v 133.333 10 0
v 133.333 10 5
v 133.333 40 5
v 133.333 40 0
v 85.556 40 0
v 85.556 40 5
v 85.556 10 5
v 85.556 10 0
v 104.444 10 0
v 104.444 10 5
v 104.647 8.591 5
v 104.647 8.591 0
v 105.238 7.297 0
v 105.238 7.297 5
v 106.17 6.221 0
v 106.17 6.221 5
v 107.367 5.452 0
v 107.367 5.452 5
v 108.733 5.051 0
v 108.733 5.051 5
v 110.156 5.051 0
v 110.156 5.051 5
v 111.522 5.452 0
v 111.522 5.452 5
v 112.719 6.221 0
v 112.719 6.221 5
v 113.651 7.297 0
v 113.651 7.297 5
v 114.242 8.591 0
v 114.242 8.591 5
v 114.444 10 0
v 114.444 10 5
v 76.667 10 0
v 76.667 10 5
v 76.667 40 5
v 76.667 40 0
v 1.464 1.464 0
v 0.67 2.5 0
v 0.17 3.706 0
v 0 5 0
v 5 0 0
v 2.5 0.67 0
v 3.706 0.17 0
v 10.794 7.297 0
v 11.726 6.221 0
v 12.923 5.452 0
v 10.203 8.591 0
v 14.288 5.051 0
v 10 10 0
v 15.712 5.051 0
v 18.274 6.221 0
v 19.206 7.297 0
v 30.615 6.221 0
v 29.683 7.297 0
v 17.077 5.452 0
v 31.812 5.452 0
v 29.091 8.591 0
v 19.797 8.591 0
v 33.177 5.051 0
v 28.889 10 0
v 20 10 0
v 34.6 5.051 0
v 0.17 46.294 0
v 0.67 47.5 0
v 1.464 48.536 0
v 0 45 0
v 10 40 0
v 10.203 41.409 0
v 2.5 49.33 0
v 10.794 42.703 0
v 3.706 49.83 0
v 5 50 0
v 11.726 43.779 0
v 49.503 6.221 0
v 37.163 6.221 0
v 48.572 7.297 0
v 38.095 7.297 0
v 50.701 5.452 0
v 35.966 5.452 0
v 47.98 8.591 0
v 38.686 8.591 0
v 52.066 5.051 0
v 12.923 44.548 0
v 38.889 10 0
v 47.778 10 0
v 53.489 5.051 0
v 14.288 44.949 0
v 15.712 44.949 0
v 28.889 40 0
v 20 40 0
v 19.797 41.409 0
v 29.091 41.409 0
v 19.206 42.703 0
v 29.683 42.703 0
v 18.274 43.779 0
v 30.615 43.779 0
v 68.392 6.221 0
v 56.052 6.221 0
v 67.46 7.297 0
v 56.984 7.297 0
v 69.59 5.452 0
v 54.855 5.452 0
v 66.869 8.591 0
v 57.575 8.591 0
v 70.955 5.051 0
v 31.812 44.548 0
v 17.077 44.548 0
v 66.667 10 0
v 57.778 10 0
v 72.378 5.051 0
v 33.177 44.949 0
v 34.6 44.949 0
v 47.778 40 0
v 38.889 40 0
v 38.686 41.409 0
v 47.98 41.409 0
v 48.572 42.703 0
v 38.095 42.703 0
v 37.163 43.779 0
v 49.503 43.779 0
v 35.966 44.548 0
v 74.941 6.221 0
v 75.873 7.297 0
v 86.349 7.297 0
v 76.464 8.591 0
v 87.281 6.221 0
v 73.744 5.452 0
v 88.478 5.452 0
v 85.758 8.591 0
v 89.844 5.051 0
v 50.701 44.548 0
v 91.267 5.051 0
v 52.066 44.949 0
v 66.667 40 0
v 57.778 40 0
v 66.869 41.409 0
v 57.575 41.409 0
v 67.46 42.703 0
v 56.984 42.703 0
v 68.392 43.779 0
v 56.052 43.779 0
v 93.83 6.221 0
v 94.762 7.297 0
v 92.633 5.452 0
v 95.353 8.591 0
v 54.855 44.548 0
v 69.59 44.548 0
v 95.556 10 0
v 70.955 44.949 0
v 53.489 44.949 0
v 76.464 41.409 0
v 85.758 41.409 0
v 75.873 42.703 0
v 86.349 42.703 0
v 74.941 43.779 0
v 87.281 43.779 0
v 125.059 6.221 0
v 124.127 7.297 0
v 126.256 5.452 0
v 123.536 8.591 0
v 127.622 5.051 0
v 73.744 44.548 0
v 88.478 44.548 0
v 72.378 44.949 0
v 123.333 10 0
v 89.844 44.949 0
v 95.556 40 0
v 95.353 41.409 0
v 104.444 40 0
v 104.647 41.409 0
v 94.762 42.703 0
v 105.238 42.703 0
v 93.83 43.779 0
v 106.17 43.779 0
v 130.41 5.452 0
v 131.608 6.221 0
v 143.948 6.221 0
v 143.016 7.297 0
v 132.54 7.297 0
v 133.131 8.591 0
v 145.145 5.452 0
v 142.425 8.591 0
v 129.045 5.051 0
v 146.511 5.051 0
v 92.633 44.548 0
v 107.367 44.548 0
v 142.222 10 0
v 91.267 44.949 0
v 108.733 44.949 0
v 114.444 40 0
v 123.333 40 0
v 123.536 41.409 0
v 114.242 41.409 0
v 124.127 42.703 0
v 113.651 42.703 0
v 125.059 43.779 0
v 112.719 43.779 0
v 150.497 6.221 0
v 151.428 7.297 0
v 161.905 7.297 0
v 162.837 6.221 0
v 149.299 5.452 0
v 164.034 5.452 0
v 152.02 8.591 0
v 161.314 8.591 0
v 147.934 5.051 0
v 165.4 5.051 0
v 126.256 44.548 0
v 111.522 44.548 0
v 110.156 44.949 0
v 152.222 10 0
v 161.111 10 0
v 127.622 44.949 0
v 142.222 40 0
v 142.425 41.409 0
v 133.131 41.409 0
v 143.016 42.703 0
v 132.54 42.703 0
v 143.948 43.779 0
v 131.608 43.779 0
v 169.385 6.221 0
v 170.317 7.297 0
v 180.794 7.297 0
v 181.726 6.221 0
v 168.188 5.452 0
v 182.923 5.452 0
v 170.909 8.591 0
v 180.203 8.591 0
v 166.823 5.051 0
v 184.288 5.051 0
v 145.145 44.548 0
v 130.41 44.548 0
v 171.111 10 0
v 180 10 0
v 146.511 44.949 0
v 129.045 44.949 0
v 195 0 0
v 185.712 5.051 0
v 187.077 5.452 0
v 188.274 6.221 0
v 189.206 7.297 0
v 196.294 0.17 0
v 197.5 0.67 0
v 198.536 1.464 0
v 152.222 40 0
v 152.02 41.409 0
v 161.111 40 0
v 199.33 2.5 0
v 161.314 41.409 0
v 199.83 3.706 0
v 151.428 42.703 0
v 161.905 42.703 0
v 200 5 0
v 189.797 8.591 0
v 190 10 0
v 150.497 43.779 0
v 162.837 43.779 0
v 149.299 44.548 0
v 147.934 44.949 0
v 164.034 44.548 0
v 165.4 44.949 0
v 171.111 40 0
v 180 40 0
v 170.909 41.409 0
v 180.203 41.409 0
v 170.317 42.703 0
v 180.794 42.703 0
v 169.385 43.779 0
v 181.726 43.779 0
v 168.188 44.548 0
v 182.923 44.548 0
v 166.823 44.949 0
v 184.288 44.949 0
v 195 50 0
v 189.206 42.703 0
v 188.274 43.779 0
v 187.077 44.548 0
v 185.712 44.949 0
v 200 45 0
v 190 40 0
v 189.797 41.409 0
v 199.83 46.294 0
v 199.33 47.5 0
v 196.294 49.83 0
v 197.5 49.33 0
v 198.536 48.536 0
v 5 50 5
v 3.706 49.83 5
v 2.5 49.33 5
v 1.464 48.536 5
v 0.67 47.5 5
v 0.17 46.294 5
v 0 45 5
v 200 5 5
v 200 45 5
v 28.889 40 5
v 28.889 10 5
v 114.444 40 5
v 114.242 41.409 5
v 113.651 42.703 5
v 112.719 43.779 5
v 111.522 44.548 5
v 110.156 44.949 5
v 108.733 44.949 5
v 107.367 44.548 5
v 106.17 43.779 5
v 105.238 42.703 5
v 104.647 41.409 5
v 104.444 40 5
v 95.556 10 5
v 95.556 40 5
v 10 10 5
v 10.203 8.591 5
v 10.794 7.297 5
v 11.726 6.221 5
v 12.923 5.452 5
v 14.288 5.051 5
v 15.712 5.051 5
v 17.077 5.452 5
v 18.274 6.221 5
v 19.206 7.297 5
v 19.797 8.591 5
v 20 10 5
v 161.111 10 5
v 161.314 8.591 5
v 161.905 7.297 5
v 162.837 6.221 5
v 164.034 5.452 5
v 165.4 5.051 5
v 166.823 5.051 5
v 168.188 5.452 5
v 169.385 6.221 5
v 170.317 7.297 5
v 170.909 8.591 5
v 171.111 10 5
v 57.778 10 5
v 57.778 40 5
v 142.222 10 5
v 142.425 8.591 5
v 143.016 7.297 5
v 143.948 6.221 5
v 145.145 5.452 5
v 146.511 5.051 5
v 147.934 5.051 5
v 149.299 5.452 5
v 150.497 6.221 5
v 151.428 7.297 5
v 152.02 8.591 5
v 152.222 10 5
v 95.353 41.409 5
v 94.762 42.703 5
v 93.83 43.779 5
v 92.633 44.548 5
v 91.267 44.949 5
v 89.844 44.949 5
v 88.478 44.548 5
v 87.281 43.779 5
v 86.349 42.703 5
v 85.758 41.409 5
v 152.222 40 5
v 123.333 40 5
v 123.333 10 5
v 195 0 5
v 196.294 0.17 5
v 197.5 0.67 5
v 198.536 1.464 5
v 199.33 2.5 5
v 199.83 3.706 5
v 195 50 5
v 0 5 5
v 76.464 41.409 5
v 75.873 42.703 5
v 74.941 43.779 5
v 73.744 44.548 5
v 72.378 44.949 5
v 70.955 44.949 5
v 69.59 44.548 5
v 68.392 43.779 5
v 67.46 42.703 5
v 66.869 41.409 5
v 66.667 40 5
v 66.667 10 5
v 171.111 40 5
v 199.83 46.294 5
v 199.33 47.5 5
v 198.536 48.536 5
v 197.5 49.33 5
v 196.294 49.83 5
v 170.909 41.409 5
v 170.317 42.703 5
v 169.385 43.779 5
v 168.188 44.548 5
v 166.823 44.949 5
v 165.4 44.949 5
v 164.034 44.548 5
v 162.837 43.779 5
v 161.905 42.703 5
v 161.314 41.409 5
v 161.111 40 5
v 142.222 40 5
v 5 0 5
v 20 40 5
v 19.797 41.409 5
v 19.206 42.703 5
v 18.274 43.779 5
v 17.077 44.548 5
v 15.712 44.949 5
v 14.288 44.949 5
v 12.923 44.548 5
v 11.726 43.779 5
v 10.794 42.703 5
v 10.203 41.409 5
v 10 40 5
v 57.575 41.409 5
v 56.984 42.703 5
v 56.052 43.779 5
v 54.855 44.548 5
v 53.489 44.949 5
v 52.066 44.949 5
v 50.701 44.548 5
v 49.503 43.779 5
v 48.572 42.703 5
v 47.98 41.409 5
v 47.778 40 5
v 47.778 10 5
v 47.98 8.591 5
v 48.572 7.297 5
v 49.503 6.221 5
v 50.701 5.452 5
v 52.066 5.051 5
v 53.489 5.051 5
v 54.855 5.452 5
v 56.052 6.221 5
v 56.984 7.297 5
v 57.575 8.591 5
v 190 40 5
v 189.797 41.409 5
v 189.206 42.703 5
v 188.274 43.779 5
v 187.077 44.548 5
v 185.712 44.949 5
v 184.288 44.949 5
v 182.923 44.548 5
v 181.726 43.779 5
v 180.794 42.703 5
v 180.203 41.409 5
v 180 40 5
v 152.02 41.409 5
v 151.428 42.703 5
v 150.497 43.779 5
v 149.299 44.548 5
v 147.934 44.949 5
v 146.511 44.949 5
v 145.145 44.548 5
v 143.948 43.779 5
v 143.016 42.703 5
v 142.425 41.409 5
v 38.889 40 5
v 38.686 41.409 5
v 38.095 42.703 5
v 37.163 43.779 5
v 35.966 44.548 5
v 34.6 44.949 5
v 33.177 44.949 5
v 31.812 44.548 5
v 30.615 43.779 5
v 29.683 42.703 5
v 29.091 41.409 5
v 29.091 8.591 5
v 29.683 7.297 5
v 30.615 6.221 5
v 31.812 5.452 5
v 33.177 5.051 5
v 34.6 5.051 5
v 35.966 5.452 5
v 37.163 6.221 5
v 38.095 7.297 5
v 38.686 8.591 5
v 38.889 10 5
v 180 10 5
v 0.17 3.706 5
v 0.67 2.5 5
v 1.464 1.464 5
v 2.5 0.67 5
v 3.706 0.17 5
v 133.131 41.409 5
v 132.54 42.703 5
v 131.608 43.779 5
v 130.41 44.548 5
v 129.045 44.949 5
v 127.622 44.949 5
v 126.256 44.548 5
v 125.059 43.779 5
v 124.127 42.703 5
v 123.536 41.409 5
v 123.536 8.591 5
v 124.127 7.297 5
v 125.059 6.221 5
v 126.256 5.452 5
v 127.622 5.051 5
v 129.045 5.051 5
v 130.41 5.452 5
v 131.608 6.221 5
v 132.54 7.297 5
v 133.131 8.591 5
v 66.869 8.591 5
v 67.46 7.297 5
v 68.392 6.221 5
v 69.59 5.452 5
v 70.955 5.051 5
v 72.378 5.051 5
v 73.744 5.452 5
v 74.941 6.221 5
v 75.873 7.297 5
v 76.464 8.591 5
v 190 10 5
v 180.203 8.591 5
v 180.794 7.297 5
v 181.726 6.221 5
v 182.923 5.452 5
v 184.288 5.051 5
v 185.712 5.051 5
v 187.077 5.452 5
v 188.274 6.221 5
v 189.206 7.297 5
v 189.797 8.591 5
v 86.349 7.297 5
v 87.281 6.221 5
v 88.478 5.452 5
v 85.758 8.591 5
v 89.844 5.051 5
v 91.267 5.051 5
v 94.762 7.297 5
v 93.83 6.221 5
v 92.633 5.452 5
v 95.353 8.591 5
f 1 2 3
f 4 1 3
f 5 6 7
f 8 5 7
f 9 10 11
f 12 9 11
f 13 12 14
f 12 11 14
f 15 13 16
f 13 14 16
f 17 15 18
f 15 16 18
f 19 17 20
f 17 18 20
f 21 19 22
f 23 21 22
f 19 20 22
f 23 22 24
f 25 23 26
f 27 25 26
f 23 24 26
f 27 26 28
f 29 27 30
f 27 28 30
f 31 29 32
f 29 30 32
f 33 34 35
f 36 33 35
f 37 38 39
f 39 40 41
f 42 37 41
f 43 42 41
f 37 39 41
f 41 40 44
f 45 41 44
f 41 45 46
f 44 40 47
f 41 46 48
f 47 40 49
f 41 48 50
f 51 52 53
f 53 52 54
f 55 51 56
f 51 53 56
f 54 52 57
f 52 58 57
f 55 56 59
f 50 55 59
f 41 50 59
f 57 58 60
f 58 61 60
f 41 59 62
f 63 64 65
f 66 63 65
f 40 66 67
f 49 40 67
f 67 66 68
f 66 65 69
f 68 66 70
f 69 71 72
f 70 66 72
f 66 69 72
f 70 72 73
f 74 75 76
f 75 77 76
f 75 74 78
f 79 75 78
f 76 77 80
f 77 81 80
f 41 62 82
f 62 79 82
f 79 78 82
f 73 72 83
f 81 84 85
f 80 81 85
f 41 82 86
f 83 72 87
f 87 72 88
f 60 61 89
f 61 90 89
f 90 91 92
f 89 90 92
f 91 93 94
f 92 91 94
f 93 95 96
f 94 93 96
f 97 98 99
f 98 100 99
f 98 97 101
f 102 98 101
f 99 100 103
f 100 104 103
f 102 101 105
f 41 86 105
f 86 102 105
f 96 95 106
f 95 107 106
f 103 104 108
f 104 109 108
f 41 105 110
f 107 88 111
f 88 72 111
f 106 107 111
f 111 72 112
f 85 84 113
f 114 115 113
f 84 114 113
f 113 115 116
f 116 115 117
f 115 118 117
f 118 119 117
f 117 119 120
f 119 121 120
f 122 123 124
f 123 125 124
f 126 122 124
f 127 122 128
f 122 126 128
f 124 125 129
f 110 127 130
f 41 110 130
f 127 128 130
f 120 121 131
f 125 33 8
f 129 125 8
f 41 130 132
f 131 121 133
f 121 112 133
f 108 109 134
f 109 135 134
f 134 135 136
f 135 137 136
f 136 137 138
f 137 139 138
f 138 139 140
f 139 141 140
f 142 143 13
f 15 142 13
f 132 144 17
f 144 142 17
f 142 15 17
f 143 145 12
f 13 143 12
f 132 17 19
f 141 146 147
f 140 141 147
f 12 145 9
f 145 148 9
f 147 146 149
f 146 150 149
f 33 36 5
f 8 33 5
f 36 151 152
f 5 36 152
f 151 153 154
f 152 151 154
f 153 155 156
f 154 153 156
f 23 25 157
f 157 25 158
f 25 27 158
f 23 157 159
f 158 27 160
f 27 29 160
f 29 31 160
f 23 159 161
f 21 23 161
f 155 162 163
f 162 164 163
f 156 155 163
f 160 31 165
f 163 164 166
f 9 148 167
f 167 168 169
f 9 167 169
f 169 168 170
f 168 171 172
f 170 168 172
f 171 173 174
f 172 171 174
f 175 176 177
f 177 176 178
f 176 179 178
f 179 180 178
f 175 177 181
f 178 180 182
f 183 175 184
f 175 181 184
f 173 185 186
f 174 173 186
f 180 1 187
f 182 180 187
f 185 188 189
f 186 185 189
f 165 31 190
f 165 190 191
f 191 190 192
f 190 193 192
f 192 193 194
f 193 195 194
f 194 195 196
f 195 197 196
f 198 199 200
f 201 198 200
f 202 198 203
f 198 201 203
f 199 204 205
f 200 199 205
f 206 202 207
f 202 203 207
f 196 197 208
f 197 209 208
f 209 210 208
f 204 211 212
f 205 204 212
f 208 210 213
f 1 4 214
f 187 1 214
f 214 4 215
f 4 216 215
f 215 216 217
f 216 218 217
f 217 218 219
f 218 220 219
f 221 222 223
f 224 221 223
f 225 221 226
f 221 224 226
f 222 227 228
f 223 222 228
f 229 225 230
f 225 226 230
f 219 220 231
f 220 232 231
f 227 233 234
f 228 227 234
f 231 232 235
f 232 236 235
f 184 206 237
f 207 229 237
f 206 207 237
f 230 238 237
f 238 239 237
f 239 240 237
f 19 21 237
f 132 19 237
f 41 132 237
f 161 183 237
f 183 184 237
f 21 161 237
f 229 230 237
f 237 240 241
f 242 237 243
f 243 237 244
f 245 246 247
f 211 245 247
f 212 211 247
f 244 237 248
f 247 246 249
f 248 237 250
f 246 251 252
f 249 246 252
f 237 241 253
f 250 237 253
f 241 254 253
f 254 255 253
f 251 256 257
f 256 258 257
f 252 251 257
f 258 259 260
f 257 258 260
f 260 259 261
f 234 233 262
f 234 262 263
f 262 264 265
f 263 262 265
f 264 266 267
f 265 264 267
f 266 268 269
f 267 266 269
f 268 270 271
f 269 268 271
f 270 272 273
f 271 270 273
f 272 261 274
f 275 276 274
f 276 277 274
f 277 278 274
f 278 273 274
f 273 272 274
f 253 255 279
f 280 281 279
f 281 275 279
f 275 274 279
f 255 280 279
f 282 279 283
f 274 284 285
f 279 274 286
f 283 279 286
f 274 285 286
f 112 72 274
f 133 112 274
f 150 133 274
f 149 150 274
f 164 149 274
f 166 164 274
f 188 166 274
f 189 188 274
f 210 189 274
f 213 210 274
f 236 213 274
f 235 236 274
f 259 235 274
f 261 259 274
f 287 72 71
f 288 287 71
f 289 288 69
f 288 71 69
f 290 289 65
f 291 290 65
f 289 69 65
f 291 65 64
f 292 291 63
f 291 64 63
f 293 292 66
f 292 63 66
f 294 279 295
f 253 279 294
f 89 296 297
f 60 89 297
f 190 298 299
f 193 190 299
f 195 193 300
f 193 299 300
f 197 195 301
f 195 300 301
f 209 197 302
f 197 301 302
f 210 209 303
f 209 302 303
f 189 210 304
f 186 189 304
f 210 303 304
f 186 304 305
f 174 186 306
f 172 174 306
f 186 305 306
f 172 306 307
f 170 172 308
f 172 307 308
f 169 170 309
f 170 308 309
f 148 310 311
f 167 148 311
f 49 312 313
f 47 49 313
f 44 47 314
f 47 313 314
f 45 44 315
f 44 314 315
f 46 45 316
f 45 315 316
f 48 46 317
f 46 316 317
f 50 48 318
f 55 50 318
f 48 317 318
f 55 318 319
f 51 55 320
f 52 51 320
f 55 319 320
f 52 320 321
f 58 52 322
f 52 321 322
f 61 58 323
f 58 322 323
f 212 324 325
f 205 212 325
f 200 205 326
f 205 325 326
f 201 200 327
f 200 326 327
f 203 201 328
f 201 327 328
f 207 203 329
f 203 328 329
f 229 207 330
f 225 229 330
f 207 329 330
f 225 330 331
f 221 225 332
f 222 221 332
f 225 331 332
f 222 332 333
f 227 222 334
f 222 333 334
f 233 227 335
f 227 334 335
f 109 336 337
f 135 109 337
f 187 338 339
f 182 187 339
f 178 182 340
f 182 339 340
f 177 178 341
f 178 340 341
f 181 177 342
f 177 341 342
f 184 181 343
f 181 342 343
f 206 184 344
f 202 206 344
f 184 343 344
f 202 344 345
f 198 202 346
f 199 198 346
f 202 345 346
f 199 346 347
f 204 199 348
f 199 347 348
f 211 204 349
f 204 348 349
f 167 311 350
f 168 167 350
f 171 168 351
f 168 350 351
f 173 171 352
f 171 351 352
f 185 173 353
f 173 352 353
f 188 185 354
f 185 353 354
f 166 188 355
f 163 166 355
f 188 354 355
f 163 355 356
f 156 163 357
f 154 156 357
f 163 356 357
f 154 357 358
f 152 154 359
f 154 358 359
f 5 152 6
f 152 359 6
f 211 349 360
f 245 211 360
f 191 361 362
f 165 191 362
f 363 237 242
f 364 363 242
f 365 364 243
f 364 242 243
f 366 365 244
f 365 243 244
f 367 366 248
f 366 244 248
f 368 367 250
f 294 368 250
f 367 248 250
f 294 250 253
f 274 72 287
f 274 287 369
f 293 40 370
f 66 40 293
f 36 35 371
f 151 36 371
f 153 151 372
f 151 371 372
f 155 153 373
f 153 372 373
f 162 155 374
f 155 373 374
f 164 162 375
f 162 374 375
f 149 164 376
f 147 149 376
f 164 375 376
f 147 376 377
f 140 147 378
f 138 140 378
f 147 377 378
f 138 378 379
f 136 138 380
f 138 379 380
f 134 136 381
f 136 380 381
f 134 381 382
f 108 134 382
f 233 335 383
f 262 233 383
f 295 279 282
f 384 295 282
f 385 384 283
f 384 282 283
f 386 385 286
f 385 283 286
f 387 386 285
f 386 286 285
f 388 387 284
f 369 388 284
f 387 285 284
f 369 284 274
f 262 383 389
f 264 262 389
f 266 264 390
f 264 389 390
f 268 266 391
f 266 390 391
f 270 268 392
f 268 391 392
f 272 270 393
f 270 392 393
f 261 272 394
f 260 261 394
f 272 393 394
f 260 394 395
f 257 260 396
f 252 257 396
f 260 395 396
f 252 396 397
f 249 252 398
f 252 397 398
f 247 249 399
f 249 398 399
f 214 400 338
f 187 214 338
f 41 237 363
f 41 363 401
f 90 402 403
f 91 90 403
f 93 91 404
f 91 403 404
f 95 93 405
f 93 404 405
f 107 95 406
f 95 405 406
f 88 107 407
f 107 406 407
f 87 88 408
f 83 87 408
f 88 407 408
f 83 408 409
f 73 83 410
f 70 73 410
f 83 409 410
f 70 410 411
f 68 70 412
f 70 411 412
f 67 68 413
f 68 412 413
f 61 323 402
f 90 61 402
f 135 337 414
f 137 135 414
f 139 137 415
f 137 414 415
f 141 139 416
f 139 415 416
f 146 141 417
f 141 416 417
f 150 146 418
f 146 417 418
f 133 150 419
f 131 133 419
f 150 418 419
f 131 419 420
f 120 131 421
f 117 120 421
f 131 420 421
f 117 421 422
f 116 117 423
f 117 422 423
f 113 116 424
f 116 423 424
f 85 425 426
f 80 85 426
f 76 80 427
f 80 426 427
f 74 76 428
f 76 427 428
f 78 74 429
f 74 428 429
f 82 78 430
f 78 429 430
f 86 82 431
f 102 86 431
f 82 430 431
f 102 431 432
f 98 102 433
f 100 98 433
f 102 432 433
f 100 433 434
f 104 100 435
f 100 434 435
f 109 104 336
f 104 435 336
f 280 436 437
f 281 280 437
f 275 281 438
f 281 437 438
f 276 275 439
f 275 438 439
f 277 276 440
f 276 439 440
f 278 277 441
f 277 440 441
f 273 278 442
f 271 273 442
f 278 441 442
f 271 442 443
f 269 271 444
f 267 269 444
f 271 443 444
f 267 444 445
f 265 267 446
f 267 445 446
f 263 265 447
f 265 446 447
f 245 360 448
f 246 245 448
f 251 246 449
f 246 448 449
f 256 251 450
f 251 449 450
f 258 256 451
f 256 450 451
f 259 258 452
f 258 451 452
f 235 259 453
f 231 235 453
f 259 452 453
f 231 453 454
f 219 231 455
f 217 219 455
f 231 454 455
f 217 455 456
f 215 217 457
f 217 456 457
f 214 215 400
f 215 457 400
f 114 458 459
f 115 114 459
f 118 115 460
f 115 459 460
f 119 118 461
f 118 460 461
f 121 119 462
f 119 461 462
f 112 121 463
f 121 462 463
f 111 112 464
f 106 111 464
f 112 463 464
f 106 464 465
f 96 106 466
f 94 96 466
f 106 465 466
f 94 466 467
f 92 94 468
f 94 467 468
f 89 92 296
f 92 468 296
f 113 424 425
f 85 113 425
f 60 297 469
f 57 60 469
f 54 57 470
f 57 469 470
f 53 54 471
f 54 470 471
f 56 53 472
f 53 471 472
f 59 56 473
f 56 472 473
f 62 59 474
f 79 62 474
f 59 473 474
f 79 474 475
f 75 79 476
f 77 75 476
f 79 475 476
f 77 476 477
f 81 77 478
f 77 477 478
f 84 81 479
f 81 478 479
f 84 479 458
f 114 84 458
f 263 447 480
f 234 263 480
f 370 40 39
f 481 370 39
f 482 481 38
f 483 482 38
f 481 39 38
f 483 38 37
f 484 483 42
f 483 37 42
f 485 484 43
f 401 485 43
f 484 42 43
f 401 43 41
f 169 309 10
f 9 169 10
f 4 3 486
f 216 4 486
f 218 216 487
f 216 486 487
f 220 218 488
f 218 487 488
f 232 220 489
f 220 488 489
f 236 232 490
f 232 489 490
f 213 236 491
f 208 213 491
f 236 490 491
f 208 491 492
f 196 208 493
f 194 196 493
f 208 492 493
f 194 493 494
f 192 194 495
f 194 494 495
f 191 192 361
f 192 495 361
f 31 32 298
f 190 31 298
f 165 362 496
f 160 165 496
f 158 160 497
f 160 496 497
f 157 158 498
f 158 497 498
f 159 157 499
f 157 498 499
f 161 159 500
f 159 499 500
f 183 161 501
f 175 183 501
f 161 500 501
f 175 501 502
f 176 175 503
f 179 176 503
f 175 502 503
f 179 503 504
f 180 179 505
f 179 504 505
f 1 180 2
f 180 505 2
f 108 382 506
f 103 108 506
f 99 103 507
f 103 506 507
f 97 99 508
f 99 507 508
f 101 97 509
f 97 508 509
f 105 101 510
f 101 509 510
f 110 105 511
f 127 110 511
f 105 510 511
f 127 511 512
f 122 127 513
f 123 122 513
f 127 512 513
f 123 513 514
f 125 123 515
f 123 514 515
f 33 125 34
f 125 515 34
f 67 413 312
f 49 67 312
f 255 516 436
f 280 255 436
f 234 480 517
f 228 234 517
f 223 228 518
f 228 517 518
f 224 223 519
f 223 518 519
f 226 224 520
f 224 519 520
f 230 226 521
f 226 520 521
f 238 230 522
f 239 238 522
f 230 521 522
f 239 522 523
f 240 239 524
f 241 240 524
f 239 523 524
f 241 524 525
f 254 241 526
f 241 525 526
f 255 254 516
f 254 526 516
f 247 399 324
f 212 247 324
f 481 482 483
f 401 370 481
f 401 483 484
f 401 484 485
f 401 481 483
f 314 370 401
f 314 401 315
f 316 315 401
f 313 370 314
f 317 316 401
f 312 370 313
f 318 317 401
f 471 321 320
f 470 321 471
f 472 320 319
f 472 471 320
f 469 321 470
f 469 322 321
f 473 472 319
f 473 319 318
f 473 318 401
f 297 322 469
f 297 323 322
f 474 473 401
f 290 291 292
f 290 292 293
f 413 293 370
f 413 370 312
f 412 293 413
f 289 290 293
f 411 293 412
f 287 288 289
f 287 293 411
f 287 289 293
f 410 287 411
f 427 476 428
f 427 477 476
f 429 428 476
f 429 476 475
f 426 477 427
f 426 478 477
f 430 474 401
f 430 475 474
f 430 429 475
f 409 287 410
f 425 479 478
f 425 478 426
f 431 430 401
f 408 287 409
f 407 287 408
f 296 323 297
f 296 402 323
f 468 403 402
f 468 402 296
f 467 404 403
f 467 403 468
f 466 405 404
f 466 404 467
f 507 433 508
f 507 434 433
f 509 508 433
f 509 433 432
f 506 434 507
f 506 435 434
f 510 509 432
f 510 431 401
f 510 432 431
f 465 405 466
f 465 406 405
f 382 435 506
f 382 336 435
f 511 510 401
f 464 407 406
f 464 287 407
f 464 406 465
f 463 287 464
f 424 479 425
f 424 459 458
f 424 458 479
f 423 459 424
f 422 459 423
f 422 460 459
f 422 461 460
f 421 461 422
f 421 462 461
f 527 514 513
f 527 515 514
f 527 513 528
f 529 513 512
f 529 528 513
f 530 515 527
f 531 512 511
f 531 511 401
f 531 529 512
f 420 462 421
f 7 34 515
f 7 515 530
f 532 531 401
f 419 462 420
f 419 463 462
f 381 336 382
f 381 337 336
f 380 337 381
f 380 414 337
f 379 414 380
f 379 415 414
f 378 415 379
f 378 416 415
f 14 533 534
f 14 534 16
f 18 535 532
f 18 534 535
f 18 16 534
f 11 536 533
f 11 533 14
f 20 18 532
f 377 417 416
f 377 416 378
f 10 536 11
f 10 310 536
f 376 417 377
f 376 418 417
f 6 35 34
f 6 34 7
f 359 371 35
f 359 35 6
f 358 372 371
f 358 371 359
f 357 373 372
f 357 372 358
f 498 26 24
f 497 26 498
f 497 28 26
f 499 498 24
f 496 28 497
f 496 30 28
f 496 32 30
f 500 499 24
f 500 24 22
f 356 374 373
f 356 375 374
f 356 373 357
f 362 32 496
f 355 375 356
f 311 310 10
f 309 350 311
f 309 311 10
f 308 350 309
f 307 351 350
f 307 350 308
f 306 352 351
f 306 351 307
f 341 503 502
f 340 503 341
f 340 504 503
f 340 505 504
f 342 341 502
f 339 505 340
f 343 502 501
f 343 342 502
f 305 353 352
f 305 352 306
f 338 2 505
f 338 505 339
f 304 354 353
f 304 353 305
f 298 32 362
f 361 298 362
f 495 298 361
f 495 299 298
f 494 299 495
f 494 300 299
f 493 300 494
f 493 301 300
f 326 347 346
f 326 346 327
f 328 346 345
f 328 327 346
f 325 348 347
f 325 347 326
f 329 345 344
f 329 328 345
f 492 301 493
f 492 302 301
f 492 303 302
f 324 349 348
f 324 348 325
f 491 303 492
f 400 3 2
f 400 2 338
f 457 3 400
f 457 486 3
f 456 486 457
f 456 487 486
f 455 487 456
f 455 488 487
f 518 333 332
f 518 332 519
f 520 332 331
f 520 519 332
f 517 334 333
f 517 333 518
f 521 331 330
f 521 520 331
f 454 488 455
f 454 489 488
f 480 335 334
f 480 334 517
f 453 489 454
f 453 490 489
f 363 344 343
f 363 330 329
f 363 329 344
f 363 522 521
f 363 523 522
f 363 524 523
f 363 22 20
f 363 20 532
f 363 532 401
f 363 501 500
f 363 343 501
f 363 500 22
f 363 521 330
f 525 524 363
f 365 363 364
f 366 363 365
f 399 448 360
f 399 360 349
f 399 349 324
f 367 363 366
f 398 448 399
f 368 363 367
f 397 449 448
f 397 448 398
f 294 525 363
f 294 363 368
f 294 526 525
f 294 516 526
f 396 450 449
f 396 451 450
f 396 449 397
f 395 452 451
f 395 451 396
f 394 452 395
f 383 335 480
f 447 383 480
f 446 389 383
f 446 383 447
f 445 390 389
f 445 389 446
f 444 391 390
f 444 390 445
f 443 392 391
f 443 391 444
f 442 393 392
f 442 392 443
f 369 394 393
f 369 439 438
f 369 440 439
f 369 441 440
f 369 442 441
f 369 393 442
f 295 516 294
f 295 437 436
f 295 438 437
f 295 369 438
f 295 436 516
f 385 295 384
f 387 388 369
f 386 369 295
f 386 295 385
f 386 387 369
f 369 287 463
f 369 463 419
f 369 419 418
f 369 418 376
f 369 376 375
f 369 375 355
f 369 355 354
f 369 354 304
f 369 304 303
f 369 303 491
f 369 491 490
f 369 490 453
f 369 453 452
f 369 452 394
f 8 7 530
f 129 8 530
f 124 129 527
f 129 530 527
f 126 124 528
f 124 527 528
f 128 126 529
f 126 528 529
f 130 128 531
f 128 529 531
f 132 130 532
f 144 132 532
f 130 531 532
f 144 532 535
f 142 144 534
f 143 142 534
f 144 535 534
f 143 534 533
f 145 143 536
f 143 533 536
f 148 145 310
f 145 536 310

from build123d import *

# Parameters (mm, degrees)
PAD_DEPTH           = 5
POCKET_DEPTH        = 5
LINEARPATTERN_COUNT = 10
LINEARPATTERN_PITCH = 18.888889


with BuildPart() as part:
    # Sketch → Pad (new body)
    with BuildSketch(Plane.XY):
        with BuildLine():
            ThreePointArc((0, 5), (1.464466, 1.464466), (5, 0))
            Line((195, 0), (5, 0))
            ThreePointArc((195, 0), (198.535534, 1.464466), (200, 5))
            Line((200, 45), (200, 5))
            ThreePointArc((200, 45), (198.535534, 48.535534), (195, 50))
            Line((5, 50), (195, 50))
            ThreePointArc((5, 50), (1.464466, 48.535534), (0, 45))
            Line((0, 5), (0, 45))
        make_face()
    extrude(amount=PAD_DEPTH)

    # Sketch001 (on Face10 of Pad) → Pocket (cut)
    with BuildSketch(Plane.XY.offset(5)):
        with BuildLine():
            ThreePointArc((10, 10), (15, 5), (20, 10))
            Line((20, 10), (20, 40))
            ThreePointArc((20, 40), (15, 45), (10, 40))
            Line((10, 40), (10, 10))
        make_face()
    pocket = extrude(amount=-POCKET_DEPTH, mode=Mode.SUBTRACT)

    # LinearPattern: Pocket ×10
    with Locations(*[(i * LINEARPATTERN_PITCH, 0, 0) for i in range(1, LINEARPATTERN_COUNT)]):
        add(pocket, mode=Mode.SUBTRACT)


solid = part.part
